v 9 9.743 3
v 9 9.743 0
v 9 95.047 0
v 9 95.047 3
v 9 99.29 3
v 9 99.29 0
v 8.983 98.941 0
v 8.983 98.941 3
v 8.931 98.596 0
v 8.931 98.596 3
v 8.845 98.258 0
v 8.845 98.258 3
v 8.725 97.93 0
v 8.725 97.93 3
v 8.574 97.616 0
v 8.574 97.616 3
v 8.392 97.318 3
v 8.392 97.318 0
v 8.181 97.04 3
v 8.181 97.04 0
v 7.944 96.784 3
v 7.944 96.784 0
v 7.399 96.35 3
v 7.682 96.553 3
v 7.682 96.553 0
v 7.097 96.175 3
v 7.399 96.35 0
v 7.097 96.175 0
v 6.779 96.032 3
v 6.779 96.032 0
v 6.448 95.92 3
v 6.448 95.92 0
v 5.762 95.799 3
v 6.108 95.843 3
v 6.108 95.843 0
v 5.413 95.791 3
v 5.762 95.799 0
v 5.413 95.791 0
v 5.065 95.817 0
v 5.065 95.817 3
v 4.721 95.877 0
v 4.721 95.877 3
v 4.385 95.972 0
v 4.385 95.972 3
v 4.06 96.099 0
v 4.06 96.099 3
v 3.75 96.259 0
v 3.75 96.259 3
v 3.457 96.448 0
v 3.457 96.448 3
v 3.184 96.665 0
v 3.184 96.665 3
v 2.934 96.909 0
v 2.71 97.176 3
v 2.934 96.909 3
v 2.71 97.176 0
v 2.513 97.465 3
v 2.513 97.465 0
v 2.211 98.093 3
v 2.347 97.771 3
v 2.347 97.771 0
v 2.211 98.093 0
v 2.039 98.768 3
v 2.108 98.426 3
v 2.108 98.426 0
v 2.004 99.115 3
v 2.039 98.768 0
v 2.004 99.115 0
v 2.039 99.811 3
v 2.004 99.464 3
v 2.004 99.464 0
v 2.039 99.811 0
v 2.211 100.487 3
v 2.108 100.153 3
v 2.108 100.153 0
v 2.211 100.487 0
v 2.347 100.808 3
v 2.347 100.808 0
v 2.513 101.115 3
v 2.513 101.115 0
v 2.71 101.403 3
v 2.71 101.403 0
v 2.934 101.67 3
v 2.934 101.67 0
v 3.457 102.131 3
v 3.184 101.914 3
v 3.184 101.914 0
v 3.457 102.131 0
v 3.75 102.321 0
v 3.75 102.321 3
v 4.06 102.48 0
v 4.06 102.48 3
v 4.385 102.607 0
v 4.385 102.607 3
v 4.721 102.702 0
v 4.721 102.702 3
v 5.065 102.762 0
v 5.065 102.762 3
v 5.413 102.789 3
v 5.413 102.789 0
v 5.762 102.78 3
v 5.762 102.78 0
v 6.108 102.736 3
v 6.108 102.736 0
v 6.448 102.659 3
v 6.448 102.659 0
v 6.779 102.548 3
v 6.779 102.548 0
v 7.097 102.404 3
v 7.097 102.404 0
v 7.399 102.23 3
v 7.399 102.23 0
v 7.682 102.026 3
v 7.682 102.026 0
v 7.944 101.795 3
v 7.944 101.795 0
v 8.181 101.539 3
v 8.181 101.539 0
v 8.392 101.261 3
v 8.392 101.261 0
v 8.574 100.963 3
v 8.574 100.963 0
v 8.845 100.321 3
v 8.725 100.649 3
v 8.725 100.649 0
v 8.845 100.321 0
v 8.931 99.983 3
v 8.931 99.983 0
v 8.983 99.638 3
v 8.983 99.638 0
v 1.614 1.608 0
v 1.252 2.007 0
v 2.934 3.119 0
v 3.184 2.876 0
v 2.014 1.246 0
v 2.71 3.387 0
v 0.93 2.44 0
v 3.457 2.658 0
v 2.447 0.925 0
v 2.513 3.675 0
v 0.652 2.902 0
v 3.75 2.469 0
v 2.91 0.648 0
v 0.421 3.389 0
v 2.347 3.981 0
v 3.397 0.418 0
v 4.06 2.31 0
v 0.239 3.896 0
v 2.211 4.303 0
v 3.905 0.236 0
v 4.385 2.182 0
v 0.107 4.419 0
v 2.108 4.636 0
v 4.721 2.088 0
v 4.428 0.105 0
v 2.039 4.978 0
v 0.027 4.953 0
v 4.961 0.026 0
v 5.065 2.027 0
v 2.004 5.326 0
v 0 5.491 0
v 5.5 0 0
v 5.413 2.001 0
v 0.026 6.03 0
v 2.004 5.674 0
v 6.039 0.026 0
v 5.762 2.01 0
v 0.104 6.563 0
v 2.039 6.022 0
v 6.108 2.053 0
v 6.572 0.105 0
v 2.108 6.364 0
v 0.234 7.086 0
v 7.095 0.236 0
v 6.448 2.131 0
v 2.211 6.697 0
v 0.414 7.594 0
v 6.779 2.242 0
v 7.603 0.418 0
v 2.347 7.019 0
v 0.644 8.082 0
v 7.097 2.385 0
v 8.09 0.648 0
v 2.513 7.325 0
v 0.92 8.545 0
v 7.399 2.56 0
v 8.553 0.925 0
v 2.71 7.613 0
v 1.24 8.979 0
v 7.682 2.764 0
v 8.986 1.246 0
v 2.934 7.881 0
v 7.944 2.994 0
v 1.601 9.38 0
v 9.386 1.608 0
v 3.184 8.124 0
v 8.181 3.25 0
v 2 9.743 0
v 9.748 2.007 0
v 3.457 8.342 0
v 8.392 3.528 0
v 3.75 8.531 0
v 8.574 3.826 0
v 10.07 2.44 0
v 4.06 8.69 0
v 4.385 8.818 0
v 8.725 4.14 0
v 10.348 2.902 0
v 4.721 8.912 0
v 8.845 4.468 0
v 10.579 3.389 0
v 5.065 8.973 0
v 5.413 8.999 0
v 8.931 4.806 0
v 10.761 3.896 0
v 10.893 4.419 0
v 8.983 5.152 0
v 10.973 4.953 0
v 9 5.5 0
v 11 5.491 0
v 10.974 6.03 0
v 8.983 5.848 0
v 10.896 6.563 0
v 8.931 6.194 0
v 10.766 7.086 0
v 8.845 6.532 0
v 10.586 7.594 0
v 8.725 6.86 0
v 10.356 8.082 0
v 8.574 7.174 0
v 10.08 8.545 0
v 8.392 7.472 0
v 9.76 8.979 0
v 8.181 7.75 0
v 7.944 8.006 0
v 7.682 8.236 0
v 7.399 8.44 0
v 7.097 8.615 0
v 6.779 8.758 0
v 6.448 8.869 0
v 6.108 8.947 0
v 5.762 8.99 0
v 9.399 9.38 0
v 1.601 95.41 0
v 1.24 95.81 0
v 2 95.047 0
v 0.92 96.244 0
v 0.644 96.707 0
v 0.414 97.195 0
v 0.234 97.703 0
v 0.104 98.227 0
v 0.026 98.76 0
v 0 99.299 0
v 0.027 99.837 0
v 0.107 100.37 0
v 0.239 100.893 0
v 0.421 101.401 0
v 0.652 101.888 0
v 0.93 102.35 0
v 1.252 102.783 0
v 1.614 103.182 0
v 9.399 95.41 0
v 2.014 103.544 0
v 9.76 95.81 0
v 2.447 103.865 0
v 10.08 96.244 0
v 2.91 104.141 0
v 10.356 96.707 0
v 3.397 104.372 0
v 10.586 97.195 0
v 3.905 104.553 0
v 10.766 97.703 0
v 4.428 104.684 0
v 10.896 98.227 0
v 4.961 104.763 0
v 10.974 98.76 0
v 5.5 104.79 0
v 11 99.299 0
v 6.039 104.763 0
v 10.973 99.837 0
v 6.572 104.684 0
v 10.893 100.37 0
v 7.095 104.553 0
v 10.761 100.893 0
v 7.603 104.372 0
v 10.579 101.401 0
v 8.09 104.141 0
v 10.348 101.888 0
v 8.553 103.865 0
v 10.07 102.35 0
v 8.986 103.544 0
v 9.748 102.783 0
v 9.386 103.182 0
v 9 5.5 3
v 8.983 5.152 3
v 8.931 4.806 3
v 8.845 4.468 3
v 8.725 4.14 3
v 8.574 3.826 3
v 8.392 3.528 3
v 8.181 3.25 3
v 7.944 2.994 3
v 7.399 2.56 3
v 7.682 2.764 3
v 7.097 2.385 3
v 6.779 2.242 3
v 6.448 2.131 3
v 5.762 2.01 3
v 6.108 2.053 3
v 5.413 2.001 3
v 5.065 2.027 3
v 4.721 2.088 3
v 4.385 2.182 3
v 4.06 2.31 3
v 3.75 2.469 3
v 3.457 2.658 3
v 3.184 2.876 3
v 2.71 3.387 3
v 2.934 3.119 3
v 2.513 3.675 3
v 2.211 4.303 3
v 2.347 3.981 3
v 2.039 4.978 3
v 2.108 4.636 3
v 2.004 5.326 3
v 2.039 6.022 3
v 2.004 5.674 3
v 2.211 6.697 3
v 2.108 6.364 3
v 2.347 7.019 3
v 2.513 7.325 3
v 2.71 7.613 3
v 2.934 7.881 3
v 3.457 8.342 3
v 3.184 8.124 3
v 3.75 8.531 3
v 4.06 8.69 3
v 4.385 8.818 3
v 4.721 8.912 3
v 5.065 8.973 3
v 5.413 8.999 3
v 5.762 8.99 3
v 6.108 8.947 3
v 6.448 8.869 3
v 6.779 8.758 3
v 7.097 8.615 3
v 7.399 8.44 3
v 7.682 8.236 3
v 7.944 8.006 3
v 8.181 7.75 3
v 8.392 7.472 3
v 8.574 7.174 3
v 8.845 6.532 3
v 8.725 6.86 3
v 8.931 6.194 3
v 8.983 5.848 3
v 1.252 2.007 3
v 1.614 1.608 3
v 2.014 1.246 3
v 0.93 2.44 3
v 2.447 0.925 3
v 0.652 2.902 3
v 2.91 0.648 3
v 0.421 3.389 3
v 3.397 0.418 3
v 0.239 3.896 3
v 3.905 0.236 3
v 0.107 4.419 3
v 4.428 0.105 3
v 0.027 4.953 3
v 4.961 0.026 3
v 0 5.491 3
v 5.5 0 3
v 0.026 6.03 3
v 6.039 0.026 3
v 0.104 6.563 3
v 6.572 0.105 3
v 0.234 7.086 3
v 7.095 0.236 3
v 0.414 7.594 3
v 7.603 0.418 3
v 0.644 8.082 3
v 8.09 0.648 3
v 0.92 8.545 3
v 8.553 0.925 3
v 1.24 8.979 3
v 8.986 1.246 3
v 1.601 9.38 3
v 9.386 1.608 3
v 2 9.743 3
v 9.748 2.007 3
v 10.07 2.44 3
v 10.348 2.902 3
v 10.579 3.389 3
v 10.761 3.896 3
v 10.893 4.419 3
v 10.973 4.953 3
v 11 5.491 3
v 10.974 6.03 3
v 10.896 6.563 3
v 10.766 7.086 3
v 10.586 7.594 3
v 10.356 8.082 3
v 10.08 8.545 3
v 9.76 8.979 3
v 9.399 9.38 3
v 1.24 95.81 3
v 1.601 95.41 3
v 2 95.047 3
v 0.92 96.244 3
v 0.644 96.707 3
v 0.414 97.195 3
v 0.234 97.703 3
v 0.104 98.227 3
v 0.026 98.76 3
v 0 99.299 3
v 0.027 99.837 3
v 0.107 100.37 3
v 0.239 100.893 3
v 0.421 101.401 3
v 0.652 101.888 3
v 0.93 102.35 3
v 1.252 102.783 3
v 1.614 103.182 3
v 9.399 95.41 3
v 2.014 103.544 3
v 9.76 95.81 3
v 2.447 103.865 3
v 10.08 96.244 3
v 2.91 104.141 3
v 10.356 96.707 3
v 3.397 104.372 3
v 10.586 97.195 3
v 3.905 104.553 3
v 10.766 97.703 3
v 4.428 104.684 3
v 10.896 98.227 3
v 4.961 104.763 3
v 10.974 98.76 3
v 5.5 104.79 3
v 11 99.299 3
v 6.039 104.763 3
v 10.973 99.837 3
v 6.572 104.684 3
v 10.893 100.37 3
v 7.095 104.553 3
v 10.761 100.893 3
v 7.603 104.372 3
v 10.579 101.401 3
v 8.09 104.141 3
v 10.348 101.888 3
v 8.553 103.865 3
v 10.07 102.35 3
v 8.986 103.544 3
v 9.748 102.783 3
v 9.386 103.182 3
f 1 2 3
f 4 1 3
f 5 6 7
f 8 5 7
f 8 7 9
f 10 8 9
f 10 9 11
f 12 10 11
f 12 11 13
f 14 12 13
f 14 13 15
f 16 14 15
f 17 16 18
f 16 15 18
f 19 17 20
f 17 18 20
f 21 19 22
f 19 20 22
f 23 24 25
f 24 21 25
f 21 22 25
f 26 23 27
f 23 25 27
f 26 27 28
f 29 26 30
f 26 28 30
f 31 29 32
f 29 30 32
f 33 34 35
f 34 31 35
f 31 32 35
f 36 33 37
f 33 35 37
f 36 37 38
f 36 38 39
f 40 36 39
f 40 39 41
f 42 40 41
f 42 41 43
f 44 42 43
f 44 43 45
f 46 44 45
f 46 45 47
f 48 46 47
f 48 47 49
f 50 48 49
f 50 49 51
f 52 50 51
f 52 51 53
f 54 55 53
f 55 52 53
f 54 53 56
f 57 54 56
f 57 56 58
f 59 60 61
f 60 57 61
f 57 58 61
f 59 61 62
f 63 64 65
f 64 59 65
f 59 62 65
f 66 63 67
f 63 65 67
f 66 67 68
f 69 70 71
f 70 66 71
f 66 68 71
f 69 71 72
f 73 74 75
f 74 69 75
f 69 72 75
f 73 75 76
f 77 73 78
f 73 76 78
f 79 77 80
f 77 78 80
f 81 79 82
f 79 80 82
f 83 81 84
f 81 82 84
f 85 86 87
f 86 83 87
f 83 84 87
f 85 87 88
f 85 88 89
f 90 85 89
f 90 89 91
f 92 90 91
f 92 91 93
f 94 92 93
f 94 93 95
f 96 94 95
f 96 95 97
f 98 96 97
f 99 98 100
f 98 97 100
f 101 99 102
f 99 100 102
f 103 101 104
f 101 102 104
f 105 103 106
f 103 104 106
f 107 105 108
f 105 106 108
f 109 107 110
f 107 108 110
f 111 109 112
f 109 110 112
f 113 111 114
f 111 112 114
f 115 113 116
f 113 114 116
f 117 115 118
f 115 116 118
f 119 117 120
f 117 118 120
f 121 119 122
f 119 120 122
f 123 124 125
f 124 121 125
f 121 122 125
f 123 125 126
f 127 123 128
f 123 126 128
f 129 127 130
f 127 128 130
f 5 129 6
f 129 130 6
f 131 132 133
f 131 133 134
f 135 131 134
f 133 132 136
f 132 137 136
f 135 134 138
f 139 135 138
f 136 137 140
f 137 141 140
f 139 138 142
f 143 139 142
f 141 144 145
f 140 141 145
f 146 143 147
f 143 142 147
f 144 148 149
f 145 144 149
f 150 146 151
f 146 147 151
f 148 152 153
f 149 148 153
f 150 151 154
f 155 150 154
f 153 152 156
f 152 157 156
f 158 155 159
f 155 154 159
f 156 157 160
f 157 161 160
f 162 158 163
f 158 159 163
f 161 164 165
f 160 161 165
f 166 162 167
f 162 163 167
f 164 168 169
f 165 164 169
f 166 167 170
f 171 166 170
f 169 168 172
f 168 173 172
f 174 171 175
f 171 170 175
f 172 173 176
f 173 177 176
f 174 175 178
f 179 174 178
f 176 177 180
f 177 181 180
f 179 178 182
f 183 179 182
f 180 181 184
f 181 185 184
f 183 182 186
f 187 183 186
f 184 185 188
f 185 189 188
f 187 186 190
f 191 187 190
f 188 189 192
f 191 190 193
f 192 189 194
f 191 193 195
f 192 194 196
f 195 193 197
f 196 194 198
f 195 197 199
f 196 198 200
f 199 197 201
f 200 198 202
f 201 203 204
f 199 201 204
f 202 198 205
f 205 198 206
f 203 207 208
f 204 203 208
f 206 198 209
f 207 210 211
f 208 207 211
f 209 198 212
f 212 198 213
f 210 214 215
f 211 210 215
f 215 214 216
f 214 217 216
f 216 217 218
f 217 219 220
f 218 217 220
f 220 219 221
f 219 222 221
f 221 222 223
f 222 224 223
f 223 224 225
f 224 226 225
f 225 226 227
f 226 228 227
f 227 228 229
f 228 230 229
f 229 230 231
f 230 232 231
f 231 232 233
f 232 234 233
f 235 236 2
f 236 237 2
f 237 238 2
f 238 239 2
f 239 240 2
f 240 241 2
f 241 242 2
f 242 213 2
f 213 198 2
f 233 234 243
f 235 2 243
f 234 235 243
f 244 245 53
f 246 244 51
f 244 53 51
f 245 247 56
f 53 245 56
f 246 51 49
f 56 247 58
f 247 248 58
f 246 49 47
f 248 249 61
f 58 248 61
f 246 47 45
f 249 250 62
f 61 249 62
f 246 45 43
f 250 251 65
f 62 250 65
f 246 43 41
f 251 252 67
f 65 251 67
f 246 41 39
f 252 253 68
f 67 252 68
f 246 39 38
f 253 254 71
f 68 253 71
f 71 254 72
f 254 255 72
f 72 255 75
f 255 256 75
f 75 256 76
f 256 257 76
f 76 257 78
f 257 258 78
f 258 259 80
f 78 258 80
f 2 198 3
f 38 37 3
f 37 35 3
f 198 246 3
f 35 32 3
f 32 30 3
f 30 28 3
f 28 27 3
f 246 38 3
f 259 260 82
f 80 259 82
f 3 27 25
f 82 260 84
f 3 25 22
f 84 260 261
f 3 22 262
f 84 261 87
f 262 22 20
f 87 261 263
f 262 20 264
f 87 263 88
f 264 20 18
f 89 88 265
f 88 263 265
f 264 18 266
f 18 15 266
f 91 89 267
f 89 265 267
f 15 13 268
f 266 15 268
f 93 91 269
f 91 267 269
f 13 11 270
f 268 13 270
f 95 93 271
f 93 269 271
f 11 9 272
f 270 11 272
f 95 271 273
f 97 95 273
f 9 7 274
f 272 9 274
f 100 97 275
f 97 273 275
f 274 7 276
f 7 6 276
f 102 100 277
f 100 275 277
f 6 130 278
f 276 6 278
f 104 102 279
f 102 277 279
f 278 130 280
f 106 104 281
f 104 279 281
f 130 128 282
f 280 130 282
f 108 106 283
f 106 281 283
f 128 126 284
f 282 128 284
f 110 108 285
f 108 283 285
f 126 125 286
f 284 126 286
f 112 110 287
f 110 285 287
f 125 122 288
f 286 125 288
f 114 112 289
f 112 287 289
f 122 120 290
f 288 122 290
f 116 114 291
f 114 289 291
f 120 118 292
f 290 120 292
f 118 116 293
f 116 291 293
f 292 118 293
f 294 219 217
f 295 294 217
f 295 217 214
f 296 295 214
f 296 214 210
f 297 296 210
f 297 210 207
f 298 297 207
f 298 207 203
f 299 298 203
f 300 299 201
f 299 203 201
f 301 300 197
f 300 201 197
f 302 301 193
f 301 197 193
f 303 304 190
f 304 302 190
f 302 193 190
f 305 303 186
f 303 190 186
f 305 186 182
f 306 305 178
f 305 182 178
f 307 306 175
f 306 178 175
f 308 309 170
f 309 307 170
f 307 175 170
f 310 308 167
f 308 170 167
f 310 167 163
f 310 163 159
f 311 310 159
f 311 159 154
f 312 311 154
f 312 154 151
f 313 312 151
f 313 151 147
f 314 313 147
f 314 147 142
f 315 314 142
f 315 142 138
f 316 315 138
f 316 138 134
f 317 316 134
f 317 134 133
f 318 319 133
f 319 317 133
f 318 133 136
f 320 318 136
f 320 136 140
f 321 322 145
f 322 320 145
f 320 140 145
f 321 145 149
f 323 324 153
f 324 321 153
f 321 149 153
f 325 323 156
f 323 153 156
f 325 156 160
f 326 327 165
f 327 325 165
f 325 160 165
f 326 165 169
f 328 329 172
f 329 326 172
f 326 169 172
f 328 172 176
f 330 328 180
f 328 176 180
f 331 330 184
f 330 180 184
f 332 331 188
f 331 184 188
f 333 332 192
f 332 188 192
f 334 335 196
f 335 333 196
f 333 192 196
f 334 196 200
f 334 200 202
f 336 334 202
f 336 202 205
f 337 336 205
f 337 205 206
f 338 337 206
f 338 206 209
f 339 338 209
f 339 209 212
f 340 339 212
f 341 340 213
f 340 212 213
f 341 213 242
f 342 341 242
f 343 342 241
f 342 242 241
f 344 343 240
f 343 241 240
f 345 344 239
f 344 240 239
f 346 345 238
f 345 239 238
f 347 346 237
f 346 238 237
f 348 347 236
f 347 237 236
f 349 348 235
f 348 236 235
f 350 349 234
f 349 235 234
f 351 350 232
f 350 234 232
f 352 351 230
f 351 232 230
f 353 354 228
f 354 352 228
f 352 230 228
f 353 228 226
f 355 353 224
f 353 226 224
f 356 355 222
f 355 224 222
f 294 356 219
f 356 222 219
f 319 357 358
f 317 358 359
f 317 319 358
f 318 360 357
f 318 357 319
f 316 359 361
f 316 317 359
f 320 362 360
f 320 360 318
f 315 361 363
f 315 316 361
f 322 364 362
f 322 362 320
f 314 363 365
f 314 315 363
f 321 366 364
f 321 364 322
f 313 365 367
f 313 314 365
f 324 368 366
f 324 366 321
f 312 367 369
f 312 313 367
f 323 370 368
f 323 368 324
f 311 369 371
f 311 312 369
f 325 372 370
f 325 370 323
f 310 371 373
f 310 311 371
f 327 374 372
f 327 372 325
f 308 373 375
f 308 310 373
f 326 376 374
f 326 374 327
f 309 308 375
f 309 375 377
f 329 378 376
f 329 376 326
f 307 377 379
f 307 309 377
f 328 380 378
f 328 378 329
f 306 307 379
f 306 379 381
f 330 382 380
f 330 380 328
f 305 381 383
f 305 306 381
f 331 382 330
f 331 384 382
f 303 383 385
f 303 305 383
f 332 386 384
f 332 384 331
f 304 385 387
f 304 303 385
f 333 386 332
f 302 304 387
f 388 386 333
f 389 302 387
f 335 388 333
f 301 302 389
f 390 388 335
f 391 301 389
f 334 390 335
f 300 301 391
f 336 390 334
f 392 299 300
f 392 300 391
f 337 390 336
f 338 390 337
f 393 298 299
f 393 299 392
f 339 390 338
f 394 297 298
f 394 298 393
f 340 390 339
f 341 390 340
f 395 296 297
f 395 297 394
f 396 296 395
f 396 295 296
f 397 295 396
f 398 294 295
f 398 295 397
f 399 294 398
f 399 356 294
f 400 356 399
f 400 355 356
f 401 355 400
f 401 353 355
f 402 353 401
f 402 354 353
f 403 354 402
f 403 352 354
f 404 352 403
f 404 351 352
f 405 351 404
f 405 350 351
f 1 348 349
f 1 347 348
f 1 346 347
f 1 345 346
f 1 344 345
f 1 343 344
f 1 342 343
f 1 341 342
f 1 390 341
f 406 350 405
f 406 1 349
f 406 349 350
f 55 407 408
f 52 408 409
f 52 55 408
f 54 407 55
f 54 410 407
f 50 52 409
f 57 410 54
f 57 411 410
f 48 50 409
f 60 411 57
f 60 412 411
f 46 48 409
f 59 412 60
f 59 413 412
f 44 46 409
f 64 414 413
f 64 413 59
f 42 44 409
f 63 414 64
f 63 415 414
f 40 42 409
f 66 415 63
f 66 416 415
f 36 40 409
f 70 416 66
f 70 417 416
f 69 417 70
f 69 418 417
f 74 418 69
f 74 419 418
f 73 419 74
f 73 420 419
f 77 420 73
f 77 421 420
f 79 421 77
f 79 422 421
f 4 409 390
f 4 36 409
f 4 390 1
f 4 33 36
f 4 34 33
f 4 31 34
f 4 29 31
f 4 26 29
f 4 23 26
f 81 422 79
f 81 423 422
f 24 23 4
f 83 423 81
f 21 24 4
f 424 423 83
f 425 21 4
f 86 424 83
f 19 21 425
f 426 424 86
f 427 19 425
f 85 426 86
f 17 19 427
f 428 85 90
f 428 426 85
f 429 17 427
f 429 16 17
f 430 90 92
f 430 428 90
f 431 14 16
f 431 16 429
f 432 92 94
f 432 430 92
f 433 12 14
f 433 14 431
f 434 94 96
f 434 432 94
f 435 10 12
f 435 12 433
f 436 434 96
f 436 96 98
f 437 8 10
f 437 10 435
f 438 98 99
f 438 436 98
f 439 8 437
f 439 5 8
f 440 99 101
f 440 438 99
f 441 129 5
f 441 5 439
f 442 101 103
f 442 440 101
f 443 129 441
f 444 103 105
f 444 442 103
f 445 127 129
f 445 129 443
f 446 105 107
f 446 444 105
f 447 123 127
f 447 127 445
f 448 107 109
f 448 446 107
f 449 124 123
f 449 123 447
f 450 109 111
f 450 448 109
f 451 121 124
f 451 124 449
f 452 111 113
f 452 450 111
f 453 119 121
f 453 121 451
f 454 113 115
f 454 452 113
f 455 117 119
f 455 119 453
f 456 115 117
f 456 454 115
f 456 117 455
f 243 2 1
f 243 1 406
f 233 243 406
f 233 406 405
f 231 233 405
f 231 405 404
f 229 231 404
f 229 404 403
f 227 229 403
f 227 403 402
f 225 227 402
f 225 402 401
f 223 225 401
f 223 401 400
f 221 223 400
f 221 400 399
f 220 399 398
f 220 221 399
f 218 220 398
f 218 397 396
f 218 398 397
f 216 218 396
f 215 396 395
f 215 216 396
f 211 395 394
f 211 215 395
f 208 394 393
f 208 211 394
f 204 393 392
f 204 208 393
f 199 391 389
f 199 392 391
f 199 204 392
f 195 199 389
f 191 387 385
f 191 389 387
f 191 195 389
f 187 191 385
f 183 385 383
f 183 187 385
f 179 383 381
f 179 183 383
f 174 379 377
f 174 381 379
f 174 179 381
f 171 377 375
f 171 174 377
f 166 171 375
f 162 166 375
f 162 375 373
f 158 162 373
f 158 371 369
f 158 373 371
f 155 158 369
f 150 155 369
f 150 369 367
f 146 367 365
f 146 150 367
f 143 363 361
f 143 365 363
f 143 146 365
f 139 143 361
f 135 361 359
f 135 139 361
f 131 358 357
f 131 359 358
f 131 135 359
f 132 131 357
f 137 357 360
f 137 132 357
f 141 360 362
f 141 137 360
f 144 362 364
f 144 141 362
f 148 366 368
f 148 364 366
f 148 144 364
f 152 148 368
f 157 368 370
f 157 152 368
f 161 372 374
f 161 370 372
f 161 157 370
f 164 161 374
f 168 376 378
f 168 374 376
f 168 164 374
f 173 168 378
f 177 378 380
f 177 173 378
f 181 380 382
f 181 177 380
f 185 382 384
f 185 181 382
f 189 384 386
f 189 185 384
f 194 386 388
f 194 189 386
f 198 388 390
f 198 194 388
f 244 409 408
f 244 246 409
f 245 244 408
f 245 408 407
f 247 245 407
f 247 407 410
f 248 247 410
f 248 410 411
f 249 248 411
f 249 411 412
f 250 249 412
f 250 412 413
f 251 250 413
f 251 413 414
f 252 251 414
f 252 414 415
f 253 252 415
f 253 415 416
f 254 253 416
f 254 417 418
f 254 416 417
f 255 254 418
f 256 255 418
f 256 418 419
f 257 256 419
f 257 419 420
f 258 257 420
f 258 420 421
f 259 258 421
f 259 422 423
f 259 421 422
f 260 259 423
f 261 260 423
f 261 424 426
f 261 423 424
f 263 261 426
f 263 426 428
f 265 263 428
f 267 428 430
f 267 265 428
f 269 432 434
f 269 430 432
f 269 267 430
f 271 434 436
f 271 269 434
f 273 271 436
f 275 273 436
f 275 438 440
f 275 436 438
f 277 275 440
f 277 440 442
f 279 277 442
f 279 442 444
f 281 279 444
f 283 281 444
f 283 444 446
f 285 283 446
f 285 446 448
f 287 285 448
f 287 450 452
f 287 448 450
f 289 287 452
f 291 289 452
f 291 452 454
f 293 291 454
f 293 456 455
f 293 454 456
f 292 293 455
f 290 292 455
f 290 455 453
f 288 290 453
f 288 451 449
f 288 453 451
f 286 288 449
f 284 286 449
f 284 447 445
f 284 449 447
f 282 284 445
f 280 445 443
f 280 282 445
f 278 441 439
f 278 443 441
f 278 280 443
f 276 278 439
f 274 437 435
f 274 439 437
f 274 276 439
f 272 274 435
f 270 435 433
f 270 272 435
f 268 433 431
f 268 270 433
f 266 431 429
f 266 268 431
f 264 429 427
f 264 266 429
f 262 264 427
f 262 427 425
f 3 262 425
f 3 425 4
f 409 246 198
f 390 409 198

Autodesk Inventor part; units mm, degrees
ref_plane "YZ Plane" through (0, 0, 0) normal (1, 0, 0) x (0, 1, 0)
ref_plane "XZ Plane" through (0, 0, 0) normal (0, 1, 0) x (-1, 0, 0)
ref_plane "XY Plane" through (0, 0, 0) normal (0, 0, 1) x (1, 0, 0)
sketch "Sketch6" plane through (0, 0, 0) normal (0, 0, 1) x (1, 0, 0)
  arc A0 (9, 95.047) -> (2, 95.047) centre (5.5, 99.2896) ccw
  arc A1 (2, 9.7426) -> (9, 9.7426) centre (5.5, 5.5) ccw
  circle A2 centre (5.5, 5.5) radius 3.5
  circle A3 centre (5.5, 99.2896) radius 3.5
  line L0 (2, 95.047) -> (2, 9.7426)
  line L1 (9, 9.7426) -> (9, 95.047)
  point P0 (0, 0)
  dimension "d89" = 93.7896
  dimension "d90" = 7
  dimension "d91" = 7
  dimension "d92" = 5.5
  dimension "d93" = 7
  dimension "d94" = 5.5
extrude "Extrusion3" add sketch "Sketch6" along normal blind 3
properties part number "4P.01.02.28-BC-v1-Final Aileron L3 80deg" material "Acrylic, Clear"
